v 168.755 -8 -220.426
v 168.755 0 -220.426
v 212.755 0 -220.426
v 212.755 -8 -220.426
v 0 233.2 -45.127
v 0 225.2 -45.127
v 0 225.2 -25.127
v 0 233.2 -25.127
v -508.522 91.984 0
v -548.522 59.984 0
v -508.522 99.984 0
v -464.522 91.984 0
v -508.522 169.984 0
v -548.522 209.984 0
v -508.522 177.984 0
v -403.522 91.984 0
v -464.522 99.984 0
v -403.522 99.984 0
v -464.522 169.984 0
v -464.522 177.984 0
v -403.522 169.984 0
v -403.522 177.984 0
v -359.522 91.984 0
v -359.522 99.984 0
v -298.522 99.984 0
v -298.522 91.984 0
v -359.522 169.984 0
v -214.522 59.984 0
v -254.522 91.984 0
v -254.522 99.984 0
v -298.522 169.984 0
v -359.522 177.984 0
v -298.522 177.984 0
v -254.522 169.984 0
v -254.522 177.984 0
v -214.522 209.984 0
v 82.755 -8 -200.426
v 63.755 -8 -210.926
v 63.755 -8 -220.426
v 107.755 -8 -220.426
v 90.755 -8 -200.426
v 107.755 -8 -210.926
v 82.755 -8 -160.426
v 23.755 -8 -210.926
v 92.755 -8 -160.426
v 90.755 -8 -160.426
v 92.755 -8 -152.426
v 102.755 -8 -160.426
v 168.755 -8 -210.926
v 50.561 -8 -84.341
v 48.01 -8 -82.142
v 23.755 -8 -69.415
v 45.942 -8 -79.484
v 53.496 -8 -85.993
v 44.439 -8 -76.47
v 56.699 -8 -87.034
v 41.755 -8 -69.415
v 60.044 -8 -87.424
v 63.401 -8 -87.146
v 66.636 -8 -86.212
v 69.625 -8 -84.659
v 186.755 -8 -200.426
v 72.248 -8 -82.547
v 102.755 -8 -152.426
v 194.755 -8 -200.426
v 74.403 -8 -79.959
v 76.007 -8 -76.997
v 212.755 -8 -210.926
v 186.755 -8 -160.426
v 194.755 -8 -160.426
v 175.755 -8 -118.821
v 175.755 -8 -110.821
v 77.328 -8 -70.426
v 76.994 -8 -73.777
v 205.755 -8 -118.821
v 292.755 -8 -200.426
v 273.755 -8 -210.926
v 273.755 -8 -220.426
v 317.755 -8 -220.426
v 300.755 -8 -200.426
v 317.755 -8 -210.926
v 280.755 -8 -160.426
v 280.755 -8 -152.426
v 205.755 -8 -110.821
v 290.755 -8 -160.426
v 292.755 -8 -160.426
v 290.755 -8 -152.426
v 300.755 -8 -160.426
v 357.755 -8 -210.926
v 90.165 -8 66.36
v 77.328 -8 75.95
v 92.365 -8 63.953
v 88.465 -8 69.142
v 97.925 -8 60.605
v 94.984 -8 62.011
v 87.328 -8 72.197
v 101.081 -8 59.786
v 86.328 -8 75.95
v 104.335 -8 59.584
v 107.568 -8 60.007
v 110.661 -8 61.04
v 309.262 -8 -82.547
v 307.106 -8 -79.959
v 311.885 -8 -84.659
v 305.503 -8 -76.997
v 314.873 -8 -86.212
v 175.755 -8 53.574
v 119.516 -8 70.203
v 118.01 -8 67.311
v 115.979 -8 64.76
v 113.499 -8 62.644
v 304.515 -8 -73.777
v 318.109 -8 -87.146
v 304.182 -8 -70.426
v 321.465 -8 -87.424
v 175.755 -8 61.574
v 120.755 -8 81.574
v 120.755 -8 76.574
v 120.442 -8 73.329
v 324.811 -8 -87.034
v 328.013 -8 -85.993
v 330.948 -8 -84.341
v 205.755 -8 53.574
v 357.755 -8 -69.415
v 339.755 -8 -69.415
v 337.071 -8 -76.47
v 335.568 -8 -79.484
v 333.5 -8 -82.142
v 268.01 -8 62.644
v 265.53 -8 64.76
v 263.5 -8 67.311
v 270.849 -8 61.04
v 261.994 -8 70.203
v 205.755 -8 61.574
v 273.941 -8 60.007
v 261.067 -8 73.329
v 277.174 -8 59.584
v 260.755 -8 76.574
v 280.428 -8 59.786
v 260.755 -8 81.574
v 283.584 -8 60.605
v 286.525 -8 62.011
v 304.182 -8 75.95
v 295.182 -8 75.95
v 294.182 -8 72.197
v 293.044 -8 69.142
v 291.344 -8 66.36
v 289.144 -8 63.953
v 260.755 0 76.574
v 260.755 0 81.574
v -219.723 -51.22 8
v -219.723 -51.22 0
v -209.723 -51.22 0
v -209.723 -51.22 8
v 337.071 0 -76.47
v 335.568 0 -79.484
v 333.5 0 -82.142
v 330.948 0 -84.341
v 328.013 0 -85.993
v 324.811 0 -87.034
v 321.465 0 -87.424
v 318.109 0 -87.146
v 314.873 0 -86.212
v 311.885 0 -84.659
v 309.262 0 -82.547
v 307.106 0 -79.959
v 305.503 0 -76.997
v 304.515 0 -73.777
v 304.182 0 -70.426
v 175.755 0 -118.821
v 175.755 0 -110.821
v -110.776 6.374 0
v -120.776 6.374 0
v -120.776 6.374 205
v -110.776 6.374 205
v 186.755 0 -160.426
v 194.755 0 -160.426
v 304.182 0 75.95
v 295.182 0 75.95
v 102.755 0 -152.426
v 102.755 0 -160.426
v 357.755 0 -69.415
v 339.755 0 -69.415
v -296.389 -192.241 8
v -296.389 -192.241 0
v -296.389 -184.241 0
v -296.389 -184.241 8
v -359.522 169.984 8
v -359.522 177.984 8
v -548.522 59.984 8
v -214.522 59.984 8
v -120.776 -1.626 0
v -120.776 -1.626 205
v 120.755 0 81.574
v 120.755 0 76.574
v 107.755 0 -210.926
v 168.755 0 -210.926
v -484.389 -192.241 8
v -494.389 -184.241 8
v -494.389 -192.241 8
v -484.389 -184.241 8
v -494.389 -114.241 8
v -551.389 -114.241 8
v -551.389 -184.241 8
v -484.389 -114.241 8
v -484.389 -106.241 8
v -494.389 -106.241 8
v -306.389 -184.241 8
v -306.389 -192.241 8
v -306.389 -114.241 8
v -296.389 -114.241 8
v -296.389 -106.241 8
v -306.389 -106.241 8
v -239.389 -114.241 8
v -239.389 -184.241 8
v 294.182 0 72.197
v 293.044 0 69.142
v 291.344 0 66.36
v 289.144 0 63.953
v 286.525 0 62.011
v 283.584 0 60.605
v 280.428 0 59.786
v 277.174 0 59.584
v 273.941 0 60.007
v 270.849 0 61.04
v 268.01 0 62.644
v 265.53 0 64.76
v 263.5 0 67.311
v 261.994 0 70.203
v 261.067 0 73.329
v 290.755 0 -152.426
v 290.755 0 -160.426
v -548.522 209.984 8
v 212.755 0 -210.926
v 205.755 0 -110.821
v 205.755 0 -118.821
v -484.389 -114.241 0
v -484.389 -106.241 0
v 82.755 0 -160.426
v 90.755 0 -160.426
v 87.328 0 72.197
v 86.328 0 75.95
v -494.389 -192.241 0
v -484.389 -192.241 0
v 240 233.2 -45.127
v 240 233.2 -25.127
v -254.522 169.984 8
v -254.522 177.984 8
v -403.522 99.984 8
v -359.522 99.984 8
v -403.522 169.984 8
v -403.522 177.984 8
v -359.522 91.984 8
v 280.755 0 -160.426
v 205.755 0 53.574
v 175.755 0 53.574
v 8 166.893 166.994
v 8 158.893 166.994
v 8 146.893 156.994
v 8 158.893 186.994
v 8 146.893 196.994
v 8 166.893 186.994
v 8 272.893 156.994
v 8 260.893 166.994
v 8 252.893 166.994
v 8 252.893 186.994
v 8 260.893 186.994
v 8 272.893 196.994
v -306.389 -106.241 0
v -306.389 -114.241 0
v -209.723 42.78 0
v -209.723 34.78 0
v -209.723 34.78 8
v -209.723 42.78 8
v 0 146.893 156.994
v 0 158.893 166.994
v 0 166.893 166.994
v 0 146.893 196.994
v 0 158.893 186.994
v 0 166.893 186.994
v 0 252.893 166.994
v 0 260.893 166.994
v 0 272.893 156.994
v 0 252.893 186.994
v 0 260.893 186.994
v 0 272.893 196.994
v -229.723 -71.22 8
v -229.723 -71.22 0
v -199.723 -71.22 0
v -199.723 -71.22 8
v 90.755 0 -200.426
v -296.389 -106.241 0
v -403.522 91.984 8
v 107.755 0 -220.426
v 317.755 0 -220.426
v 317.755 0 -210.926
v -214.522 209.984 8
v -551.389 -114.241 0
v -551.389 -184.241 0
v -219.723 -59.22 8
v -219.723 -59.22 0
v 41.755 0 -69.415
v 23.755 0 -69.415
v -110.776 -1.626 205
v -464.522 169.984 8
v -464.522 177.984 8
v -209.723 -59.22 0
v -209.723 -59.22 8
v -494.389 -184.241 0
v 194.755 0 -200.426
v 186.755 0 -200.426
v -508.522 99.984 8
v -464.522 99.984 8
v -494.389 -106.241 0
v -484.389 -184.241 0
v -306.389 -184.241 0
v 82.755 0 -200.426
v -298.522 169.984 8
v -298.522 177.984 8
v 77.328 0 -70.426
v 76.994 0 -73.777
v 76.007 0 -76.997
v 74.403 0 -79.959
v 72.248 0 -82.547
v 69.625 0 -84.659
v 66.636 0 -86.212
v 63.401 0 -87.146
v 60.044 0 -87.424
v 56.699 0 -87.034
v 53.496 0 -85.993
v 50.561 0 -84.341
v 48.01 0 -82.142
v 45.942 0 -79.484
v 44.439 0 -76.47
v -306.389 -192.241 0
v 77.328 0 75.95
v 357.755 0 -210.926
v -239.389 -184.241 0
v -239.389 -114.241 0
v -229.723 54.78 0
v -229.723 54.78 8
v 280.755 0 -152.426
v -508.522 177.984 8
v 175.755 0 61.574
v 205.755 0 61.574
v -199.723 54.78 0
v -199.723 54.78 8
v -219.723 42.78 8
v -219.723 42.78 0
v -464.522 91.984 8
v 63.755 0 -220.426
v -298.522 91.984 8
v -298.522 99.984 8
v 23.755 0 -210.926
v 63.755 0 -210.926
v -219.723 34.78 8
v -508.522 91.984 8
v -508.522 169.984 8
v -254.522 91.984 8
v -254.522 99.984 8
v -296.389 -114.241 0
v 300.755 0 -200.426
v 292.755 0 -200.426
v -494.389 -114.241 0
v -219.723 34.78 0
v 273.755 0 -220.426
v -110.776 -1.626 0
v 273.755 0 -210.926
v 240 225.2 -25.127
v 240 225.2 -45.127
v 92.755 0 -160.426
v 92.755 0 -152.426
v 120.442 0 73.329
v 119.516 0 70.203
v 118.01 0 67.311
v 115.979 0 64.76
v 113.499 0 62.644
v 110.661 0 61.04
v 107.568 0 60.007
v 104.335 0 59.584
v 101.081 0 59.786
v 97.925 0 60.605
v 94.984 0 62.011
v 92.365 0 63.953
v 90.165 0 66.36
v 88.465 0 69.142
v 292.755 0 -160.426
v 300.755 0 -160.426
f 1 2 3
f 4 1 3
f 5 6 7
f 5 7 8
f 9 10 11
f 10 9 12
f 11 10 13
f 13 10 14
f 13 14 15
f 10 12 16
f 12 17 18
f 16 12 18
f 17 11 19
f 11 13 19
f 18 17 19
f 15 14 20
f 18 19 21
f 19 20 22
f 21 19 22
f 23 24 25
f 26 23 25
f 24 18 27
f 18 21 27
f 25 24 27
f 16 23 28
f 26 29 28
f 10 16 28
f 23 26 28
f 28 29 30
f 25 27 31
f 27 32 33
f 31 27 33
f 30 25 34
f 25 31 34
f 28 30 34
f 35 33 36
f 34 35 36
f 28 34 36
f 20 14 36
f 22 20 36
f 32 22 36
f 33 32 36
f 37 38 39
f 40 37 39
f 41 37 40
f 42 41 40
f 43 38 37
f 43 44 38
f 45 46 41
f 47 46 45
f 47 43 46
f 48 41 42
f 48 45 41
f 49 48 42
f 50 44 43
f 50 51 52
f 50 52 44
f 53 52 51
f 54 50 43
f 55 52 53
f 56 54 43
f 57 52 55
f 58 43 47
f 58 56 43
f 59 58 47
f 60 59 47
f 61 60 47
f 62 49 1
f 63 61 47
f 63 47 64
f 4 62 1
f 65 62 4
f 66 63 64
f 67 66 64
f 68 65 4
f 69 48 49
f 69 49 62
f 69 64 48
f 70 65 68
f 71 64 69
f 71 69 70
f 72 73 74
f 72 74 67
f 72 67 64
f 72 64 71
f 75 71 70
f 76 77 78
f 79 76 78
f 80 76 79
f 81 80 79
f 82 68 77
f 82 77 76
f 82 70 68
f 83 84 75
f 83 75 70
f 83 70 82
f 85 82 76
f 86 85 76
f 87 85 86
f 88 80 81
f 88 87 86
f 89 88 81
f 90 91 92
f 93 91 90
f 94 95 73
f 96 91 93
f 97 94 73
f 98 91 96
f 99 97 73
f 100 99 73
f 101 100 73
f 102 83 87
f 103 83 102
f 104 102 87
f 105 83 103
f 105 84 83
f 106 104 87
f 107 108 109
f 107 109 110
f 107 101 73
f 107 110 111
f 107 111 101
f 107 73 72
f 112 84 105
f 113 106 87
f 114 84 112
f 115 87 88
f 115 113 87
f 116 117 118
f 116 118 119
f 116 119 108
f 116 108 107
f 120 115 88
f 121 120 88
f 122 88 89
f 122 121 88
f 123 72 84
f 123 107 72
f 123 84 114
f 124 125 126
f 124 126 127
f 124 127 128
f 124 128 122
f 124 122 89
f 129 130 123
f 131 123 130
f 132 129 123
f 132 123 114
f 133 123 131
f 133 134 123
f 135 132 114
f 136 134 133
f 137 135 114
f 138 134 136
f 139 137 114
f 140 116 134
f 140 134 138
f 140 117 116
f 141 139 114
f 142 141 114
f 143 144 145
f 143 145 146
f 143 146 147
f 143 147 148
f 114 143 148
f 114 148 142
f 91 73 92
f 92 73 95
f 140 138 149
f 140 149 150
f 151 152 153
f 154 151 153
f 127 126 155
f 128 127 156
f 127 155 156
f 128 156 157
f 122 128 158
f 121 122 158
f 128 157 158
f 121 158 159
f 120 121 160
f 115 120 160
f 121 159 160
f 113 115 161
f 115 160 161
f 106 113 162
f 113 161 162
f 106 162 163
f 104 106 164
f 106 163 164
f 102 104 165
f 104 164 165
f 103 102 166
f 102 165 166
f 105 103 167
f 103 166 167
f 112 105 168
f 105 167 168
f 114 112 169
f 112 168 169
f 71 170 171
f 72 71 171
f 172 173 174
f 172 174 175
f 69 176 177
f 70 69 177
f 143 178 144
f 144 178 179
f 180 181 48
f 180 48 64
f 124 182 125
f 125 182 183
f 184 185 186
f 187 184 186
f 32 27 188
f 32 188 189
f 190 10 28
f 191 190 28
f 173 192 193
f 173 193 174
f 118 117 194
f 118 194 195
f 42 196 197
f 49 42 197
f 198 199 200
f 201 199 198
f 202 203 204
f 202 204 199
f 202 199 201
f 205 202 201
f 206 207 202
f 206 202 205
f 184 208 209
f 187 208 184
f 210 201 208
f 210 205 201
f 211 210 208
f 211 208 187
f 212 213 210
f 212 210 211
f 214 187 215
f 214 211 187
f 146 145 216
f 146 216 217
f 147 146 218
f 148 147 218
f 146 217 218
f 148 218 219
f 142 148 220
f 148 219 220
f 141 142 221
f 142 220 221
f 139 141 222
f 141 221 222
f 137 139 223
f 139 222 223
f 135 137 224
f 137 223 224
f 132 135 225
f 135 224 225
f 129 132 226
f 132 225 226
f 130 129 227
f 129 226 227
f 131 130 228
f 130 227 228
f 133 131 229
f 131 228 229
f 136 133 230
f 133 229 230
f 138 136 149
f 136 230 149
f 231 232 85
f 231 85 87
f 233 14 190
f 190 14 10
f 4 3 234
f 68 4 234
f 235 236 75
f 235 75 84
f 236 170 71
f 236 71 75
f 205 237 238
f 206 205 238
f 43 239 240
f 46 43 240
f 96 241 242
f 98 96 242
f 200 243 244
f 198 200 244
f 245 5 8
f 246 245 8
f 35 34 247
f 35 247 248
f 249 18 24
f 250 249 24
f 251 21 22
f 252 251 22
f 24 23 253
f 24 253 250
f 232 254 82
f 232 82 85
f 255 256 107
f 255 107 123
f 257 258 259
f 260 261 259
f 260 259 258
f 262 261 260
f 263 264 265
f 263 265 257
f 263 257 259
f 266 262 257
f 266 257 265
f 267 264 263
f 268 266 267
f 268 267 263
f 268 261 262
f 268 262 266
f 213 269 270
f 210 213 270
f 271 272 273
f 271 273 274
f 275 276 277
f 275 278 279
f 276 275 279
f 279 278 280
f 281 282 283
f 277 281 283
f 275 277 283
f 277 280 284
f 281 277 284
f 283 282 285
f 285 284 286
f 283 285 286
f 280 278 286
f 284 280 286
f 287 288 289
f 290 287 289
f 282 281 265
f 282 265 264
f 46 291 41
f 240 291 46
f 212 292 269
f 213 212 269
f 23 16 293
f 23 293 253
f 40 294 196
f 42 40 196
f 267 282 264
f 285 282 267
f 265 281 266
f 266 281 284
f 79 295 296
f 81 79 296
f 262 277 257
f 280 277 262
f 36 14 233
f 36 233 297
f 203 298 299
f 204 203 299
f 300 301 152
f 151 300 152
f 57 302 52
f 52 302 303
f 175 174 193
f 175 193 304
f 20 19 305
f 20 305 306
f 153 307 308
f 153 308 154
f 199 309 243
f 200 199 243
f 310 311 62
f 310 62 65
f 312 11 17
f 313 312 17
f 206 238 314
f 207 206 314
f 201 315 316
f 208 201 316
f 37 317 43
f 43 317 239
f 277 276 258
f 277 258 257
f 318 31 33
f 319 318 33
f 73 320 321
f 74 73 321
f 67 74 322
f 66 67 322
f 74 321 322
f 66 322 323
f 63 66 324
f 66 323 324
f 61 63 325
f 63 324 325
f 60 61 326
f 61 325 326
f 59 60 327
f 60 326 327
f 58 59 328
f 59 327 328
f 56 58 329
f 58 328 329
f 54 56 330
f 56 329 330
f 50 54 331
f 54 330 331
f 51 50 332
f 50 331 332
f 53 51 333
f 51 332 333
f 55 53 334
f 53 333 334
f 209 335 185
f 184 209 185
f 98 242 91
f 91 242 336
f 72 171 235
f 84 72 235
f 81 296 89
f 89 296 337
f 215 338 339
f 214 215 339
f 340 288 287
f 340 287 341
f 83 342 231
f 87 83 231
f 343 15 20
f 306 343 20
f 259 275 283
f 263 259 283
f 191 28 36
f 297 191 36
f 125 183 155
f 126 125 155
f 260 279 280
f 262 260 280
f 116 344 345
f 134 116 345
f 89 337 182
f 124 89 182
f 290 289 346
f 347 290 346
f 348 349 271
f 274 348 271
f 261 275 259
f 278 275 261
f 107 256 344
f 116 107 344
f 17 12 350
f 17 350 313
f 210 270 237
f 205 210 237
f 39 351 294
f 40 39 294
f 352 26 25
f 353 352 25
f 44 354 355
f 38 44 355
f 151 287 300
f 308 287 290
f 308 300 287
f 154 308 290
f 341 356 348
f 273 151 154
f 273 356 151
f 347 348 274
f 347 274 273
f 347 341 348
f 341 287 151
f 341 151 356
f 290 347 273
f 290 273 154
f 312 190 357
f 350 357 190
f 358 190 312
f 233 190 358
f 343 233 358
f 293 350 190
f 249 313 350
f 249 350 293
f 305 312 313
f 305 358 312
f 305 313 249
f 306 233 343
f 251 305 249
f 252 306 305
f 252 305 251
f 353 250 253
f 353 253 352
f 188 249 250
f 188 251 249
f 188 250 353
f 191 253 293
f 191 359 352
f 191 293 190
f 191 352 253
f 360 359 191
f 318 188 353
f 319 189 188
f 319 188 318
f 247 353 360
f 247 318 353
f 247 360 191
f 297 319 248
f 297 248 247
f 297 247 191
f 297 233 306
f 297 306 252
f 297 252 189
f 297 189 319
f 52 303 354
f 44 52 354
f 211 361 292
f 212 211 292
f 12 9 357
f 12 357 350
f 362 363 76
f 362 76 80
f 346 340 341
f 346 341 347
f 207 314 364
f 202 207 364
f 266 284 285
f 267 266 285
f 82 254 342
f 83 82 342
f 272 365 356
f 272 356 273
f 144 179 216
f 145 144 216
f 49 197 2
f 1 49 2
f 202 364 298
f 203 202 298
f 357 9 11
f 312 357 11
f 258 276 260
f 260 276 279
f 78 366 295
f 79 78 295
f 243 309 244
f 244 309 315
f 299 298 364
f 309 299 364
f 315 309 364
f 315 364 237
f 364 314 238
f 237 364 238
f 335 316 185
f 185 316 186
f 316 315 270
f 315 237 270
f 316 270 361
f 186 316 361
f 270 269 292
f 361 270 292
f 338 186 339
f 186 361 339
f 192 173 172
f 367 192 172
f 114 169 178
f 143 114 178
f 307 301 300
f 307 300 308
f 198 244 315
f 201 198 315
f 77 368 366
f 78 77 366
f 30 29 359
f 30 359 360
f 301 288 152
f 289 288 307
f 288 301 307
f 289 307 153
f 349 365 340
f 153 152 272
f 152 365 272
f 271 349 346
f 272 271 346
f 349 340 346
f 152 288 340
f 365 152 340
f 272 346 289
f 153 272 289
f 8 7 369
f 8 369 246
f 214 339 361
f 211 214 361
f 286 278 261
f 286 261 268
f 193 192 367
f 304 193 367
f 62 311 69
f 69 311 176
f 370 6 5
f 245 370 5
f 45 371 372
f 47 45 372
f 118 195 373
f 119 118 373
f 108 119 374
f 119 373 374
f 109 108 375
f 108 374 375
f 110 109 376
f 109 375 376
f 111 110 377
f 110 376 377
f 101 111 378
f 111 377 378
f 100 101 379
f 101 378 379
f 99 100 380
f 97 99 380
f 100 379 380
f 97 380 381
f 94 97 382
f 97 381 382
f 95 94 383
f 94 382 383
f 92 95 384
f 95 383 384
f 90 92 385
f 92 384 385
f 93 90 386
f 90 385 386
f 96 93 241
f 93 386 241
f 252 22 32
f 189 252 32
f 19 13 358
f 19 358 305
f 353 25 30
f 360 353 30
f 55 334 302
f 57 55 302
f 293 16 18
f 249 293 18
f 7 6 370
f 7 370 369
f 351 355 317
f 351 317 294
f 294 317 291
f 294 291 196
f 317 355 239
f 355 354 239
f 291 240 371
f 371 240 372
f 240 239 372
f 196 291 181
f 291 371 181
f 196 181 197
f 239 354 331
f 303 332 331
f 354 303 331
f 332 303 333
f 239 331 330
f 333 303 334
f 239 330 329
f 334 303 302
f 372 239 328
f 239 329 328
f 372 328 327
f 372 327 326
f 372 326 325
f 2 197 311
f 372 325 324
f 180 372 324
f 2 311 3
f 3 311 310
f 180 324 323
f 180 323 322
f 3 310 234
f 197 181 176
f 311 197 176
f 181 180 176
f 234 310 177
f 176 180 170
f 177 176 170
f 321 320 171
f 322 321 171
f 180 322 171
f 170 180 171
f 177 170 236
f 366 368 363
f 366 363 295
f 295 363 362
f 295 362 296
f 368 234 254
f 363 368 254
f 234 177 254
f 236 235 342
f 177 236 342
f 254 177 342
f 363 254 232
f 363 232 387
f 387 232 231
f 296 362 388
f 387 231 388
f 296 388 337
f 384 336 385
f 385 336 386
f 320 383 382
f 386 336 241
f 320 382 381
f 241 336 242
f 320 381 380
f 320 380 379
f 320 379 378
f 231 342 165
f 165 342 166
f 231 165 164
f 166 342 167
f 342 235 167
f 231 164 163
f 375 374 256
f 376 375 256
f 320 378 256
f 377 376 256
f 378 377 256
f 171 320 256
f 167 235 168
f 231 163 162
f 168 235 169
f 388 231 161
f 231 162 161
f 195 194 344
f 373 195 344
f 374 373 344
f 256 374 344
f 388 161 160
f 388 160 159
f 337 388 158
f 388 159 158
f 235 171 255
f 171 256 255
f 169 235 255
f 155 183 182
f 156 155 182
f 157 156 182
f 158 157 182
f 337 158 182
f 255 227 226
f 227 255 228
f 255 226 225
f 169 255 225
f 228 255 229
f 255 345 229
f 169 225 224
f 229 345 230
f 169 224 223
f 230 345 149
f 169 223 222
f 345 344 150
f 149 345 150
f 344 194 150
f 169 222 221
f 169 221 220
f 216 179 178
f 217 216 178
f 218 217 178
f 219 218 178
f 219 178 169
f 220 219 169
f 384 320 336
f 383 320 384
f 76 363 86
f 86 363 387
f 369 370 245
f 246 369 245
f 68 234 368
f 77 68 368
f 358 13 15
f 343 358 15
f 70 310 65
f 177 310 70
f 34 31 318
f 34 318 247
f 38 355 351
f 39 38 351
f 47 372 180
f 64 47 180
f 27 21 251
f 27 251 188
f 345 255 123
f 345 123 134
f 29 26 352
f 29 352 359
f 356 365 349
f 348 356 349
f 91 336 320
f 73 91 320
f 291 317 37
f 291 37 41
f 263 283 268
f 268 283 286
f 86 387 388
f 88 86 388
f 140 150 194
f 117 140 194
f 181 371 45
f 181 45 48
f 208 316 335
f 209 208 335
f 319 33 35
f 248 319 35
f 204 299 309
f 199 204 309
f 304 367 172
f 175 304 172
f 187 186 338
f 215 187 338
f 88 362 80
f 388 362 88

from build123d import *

# Parameters (mm, degrees)
F0_W      = 8
F0_H      = 40
F0_W_2    = 10
F0_H_2    = 8
F0_W_3    = 30
F1_DEPTH  = 8
F2_W      = 30
F2_H      = 126
F2_W_2    = 10
F2_H_2    = 8
F3_DEPTH  = 8
F4_W      = 126
F4_H      = 40
F4_W_2    = 8
F4_H_2    = 20
F5_DEPTH  = 8
F6_W      = 8
F6_H      = 20
F7_DEPTH  = 240
F8_W      = 10
F8_H      = 8
F9_DEPTH  = 205
F11_DEPTH = 8
F12_W     = 334
F12_H     = 75
F12_W_2   = 44
F12_H_2   = 8
F13_DEPTH = 8


with BuildPart() as f1:
    # F0 (on Front) → F1 (new body)
    with BuildSketch(Plane.XZ):
        with BuildLine():
            Line((168.754732, -220.425971), (190.754732, -220.425971))
            Line((190.754732, -220.425971), (212.754732, -220.425971))
            Line((212.754732, -220.425971), (212.754732, -210.925971))
            Line((212.754732, -210.925971), (273.754732, -210.925971))
            Line((273.754732, -210.925971), (273.754732, -220.425971))
            Line((273.754732, -220.425971), (317.754732, -220.425971))
            Line((317.754732, -220.425971), (317.754732, -210.925971))
            Line((317.754732, -210.925971), (357.754732, -210.925971))
            Line((357.754732, -210.925971), (357.754732, -69.414692))
            Line((357.754732, -69.414692), (339.754732, -69.414692))
            Line((339.754732, -69.414692), (337.070861, -76.470164))
            ThreePointArc((337.070861, -76.470164), (318.108923, -87.145974), (304.181628, -70.425971))
            Line((304.181628, -70.425971), (304.181628, 75.950258))
            Line((304.181628, 75.950258), (295.181628, 75.950258))
            Line((295.181628, 75.950258), (294.181628, 72.19715))
            ThreePointArc((294.181628, 72.19715), (275.547612, 59.717914), (260.754732, 76.574029))
            Line((260.754732, 76.574029), (260.754732, 81.574029))
            Line((260.754732, 81.574029), (190.754732, 81.574029))
            Line((190.754732, 81.574029), (120.754732, 81.574029))
            Line((120.754732, 81.574029), (120.754732, 76.574029))
            ThreePointArc((120.754732, 76.574029), (105.961852, 59.717914), (87.327835, 72.19715))
            Line((87.327835, 72.19715), (86.327835, 75.950258))
            Line((86.327835, 75.950258), (77.327835, 75.950258))
            Line((77.327835, 75.950258), (77.327835, -70.425971))
            ThreePointArc((77.327835, -70.425971), (63.40054, -87.145974), (44.438602, -76.470164))
            Line((44.438602, -76.470164), (41.754732, -69.414692))
            Line((41.754732, -69.414692), (23.754732, -69.414692))
            Line((23.754732, -69.414692), (23.754732, -210.925971))
            Line((23.754732, -210.925971), (63.754732, -210.925971))
            Line((63.754732, -210.925971), (63.754732, -220.425971))
            Line((63.754732, -220.425971), (107.754732, -220.425971))
            Line((107.754732, -220.425971), (107.754732, -210.925971))
            Line((107.754732, -210.925971), (168.754732, -210.925971))
            Line((168.754732, -210.925971), (168.754732, -220.425971))
        make_face()
        with Locations((86.754732, -180.425971)):
            Rectangle(F0_W, F0_H, mode=Mode.SUBTRACT)
        with Locations((97.754732, -156.425971)):
            Rectangle(F0_W_2, F0_H_2, mode=Mode.SUBTRACT)
        with Locations((190.754732, -114.820627)):
            Rectangle(F0_W_3, F0_H_2, mode=Mode.SUBTRACT)
        with Locations((190.754732, -180.425971)):
            Rectangle(F0_W, F0_H, mode=Mode.SUBTRACT)
        with Locations((296.754732, -180.425971)):
            Rectangle(F0_W, F0_H, mode=Mode.SUBTRACT)
        with Locations((285.754732, -156.425971)):
            Rectangle(F0_W_2, F0_H_2, mode=Mode.SUBTRACT)
        with Locations((190.754732, 57.574029)):
            Rectangle(F0_W_3, F0_H_2, mode=Mode.SUBTRACT)
    extrude(amount=F1_DEPTH)


with BuildPart() as f3:
    # F2 (on Top) → F3 (new body)
    with BuildSketch(Plane.XY):
        with Locations((-214.722842, -8.219968)):
            Rectangle(F2_W, F2_H)
        with Locations((-214.722842, -55.219968)):
            Rectangle(F2_W_2, F2_H_2, mode=Mode.SUBTRACT)
        with Locations((-214.722842, 38.780032)):
            Rectangle(F2_W_2, F2_H_2, mode=Mode.SUBTRACT)
    extrude(amount=F3_DEPTH)


with BuildPart() as f5:
    # F4 (on Right) → F5 (new body)
    with BuildSketch(Plane.YZ):
        with Locations((209.892505, 176.993862)):
            Rectangle(F4_W, F4_H)
        with Locations((256.892505, 176.993862)):
            Rectangle(F4_W_2, F4_H_2, mode=Mode.SUBTRACT)
        with Locations((162.892505, 176.993862)):
            Rectangle(F4_W_2, F4_H_2, mode=Mode.SUBTRACT)
    extrude(amount=F5_DEPTH)


with BuildPart() as f7:
    # F6 (on Right) → F7 (new body)
    with BuildSketch(Plane.YZ):
        with Locations((229.199918, -35.127133)):
            Rectangle(F6_W, F6_H)
    extrude(amount=F7_DEPTH)


with BuildPart() as f9:
    # F8 (on Top) → F9 (new body)
    with BuildSketch(Plane.XY):
        with Locations((-115.77574, 2.373506)):
            Rectangle(F8_W, F8_H)
    extrude(amount=F9_DEPTH)


with BuildPart() as f11:
    # F10 (on Top) → F11 (new body)
    with BuildSketch(Plane.XY):
        Polygon((-494.388868, -114.241416), (-551.388868, -114.241416), (-551.388868, -184.241416), (-494.388868, -184.241416), (-494.388868, -192.241416), (-484.388868, -192.241416), (-484.388868, -184.241416), (-395.388868, -184.241416), (-395.388868, -114.241416), (-484.388868, -114.241416), (-484.388868, -106.241416), (-494.388868, -106.241416), align=None)
        Polygon((-306.388868, -114.241416), (-395.388868, -114.241416), (-395.388868, -184.241416), (-306.388868, -184.241416), (-306.388868, -192.241416), (-296.388868, -192.241416), (-296.388868, -184.241416), (-239.388868, -184.241416), (-239.388868, -114.241416), (-296.388868, -114.241416), (-296.388868, -106.241416), (-306.388868, -106.241416), align=None)
    extrude(amount=F11_DEPTH)


with BuildPart() as f13:
    # F12 (on Top) → F13 (new body)
    with BuildSketch(Plane.XY):
        with Locations((-381.521738, 172.483955)):
            Rectangle(F12_W, F12_H)
        with Locations((-486.521738, 173.983955)):
            Rectangle(F12_W_2, F12_H_2, mode=Mode.SUBTRACT)
        with Locations((-381.521738, 173.983955)):
            Rectangle(F12_W_2, F12_H_2, mode=Mode.SUBTRACT)
        with Locations((-276.521738, 173.983955)):
            Rectangle(F12_W_2, F12_H_2, mode=Mode.SUBTRACT)
        with Locations((-381.521738, 97.483955)):
            Rectangle(F12_W, F12_H)
        with Locations((-486.521738, 95.983955)):
            Rectangle(F12_W_2, F12_H_2, mode=Mode.SUBTRACT)
        with Locations((-381.521738, 95.983955)):
            Rectangle(F12_W_2, F12_H_2, mode=Mode.SUBTRACT)
        with Locations((-276.521738, 95.983955)):
            Rectangle(F12_W_2, F12_H_2, mode=Mode.SUBTRACT)
    extrude(amount=F13_DEPTH)


solid = Compound([f1.part, f3.part, f5.part, f7.part, f9.part, f11.part, f13.part])
